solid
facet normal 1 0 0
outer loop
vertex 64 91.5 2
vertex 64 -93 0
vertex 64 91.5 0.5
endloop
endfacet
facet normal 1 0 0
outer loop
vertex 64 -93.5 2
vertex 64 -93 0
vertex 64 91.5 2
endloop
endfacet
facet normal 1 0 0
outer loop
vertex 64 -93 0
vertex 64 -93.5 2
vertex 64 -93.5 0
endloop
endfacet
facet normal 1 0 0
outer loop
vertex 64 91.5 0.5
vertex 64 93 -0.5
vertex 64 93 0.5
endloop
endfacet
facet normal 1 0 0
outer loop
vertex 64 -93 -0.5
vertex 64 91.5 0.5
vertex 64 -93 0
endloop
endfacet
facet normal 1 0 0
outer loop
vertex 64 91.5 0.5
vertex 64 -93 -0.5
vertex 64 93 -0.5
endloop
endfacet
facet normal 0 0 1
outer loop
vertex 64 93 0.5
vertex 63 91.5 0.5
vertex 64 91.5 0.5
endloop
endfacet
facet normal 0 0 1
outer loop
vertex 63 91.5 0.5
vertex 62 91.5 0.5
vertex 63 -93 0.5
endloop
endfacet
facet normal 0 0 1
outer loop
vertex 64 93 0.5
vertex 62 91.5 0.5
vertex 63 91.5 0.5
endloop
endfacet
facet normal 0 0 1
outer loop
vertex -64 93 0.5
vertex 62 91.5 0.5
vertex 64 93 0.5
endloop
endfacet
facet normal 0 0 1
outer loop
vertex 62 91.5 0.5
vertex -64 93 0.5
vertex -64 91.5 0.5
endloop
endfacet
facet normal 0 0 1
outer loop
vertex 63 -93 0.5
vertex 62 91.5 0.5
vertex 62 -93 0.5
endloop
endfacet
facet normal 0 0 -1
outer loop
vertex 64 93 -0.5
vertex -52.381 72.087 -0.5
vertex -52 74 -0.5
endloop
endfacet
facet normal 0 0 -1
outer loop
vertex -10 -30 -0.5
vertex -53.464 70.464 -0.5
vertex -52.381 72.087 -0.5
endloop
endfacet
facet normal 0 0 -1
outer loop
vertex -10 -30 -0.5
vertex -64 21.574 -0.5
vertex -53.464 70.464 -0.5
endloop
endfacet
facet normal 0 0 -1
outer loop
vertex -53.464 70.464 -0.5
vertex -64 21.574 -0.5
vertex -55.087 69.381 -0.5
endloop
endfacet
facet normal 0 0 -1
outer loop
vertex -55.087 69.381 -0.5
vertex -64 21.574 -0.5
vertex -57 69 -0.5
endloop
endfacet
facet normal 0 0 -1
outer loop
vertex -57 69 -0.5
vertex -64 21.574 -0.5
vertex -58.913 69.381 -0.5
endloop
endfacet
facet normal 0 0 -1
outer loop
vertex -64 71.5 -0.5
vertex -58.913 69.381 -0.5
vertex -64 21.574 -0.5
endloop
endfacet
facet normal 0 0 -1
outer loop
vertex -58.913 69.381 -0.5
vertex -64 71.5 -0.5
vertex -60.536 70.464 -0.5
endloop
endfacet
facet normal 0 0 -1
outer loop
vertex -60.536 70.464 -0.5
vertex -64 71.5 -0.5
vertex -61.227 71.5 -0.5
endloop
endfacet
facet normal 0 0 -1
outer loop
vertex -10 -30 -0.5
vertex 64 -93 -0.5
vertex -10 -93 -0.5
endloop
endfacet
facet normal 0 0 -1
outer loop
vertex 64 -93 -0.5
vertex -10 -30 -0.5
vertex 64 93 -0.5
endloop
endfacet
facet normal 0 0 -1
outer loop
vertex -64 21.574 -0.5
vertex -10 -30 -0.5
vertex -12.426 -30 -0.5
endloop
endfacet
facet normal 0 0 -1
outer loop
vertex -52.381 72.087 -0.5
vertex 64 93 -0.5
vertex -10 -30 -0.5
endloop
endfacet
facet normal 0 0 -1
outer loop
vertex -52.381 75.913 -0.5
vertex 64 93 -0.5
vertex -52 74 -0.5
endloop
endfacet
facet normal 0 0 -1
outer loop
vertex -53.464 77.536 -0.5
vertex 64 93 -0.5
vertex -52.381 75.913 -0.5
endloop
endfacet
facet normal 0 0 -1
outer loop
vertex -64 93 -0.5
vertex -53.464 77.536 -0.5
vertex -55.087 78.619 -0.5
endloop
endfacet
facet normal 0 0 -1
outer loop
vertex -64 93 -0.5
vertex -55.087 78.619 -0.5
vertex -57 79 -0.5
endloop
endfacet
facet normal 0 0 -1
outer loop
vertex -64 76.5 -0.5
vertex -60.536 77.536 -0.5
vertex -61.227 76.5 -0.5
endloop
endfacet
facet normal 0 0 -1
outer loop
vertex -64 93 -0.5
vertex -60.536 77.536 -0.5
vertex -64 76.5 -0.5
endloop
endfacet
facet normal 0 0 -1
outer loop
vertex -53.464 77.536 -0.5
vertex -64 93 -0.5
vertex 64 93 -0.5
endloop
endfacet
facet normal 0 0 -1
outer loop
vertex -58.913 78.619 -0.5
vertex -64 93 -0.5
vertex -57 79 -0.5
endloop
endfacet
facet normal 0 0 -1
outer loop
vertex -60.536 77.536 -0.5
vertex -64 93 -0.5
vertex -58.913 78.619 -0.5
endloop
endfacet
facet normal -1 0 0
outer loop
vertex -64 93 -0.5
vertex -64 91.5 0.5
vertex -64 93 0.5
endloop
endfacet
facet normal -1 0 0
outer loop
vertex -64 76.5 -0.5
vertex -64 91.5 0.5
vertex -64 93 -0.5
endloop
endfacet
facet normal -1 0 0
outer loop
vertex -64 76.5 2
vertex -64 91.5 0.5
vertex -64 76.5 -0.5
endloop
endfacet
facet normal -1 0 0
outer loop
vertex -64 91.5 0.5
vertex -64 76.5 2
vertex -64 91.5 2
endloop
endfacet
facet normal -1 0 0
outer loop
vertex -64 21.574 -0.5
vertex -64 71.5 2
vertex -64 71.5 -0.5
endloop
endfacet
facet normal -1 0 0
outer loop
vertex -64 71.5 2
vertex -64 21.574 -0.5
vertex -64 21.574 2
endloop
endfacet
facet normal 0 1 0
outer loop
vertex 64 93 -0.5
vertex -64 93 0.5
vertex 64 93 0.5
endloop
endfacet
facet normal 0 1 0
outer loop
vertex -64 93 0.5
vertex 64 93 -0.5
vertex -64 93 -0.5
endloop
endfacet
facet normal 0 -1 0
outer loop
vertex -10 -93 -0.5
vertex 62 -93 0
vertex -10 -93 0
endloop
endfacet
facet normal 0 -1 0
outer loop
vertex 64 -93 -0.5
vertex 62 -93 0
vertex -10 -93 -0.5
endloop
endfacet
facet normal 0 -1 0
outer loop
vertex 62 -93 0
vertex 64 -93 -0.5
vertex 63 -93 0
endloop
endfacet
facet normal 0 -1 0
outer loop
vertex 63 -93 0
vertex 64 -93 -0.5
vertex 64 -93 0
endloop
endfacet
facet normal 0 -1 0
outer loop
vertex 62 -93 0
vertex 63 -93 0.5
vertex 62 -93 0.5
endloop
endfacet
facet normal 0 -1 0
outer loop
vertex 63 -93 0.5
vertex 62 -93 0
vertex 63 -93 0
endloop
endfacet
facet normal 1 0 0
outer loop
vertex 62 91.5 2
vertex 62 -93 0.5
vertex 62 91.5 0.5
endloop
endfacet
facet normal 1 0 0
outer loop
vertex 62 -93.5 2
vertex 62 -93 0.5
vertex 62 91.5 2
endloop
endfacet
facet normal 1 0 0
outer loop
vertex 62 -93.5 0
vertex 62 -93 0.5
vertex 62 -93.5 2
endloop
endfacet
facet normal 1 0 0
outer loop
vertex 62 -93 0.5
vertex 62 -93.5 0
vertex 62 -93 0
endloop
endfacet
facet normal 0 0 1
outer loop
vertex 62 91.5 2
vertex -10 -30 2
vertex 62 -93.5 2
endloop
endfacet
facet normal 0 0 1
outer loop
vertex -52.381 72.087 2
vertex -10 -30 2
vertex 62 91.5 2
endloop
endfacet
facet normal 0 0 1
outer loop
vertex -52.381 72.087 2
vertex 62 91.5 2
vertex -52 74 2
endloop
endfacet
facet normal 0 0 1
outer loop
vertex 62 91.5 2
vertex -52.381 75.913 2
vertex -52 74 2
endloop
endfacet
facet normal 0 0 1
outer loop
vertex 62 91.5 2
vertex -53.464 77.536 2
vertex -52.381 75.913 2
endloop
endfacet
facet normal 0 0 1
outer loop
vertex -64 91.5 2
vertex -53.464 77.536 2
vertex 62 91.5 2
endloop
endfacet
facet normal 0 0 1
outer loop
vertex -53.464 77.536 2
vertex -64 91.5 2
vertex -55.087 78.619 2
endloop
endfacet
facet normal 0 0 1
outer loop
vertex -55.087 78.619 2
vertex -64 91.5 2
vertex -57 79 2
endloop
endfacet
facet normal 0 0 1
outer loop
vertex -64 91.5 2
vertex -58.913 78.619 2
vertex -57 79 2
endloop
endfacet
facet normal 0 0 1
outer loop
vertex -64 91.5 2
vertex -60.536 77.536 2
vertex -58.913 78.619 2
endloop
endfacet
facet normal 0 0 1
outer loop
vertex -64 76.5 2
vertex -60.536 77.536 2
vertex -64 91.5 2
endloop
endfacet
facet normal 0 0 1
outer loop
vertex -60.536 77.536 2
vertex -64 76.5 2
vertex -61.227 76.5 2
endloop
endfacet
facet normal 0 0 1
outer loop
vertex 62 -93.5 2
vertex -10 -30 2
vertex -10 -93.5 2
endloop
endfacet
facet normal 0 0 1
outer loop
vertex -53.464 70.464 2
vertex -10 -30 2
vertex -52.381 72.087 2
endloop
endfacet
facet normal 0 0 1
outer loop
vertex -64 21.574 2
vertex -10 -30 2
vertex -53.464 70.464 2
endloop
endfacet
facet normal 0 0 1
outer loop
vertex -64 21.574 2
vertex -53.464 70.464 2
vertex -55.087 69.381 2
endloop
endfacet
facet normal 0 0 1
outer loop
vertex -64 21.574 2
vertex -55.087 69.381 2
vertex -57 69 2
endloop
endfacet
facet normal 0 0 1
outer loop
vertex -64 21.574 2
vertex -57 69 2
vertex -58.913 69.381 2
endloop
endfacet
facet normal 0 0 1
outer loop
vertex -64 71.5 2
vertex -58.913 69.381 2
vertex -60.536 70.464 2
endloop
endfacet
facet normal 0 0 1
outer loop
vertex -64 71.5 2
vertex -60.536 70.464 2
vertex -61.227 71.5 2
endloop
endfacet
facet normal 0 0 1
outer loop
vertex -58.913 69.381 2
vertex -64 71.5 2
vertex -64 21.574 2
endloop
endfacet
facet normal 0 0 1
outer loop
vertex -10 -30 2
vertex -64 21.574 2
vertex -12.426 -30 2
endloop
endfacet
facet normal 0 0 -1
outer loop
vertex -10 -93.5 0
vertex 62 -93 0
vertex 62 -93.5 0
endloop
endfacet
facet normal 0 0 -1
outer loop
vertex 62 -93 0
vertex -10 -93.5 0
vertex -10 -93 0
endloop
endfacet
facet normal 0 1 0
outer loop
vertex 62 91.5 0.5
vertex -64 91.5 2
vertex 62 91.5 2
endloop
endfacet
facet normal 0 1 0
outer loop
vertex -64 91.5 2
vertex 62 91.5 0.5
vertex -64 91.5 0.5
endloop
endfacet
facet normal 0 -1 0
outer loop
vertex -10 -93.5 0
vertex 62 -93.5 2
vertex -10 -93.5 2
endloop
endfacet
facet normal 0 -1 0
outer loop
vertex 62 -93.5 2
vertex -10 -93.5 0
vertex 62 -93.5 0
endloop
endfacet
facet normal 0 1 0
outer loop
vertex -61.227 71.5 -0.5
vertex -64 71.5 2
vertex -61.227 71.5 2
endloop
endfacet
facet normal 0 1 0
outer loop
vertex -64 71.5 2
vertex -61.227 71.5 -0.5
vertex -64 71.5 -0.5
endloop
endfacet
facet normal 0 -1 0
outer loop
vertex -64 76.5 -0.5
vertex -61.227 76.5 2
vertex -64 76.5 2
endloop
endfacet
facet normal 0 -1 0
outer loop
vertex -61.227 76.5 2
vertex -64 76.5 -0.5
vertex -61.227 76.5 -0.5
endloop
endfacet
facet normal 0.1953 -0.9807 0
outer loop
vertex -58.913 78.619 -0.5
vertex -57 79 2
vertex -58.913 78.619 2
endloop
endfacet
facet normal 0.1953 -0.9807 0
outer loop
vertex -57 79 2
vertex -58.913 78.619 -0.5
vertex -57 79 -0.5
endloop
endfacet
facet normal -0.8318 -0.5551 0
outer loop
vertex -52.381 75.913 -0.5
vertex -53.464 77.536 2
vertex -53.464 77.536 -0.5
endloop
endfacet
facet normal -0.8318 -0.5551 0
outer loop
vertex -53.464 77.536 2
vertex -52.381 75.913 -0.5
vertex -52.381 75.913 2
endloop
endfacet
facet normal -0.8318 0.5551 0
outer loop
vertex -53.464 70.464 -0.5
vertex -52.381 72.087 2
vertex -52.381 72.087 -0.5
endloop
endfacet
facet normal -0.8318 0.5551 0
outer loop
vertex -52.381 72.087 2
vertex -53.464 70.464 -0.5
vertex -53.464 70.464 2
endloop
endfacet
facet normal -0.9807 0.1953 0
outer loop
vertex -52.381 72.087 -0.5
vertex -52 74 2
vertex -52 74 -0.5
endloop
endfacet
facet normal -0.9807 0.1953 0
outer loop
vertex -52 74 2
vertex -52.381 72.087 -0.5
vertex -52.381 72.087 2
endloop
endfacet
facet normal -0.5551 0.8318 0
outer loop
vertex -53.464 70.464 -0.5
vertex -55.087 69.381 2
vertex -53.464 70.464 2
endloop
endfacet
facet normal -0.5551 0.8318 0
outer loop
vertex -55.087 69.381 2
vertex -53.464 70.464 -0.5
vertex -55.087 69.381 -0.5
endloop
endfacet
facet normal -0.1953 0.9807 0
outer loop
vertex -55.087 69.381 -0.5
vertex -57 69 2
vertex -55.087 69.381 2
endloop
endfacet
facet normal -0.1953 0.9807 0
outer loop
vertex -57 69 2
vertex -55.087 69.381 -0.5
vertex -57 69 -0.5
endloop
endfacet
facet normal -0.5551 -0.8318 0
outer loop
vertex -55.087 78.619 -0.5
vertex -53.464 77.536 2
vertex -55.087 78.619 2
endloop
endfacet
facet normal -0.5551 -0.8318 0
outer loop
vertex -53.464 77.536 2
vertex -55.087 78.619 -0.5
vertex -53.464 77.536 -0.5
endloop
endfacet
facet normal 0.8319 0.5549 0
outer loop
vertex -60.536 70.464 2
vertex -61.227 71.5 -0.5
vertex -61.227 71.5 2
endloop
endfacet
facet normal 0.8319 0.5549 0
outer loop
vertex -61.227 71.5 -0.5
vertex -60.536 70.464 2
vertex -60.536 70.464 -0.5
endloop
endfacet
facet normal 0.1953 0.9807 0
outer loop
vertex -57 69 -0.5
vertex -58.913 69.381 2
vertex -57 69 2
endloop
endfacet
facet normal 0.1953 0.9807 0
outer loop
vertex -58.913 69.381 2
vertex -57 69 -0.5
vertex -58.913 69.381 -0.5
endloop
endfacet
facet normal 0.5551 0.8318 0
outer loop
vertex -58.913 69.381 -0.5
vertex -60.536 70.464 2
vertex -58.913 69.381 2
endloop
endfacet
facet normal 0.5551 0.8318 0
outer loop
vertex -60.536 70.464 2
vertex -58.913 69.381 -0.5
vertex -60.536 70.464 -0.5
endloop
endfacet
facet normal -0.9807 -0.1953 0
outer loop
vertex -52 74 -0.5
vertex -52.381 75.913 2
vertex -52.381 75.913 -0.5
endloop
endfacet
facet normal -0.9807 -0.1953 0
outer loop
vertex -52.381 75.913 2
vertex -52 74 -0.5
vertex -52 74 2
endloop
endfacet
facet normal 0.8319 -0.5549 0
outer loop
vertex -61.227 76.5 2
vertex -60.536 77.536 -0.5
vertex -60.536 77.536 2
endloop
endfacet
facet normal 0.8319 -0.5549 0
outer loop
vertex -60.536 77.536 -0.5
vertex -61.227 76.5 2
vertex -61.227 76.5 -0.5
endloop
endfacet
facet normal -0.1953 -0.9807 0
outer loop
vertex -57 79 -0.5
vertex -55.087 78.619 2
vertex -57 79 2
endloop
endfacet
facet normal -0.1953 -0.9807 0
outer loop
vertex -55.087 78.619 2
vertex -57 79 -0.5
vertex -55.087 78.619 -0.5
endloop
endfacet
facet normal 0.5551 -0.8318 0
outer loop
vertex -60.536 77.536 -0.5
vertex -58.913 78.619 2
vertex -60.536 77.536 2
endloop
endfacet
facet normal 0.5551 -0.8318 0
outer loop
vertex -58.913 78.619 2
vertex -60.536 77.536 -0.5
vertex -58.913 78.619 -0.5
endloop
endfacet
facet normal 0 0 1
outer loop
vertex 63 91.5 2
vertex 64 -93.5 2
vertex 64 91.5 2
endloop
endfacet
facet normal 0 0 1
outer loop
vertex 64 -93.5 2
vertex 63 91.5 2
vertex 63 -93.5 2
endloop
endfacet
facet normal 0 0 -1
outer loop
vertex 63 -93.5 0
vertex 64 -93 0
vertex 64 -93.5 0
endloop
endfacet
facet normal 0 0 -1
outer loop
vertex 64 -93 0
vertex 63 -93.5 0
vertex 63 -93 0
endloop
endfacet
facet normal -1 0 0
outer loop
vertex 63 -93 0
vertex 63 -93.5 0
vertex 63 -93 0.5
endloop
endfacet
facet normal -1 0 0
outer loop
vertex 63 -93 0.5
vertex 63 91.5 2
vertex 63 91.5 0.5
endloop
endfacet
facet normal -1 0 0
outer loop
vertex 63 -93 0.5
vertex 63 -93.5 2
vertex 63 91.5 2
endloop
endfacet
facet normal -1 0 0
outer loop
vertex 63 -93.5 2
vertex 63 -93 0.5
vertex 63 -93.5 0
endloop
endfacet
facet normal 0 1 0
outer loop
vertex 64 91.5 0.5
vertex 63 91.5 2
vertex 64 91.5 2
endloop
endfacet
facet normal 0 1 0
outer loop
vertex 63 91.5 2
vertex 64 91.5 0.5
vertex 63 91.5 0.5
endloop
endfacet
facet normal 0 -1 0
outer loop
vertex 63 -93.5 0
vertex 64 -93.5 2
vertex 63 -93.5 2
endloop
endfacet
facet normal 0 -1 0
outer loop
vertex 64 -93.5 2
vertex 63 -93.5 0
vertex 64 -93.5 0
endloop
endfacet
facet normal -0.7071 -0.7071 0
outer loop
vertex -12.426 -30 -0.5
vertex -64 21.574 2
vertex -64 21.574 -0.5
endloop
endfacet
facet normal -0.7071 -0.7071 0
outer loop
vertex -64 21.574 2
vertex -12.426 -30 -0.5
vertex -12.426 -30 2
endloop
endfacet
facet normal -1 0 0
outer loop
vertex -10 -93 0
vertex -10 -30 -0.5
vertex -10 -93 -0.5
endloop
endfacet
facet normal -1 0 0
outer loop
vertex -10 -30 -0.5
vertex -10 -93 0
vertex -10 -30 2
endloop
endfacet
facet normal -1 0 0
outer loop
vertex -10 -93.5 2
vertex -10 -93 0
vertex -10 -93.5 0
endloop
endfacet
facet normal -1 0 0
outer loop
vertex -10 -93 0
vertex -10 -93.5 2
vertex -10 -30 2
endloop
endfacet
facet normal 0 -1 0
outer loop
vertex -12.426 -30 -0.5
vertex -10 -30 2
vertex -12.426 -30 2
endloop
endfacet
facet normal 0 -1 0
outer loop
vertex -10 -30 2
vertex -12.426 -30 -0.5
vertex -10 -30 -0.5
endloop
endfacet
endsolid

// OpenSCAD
// file: piece-6-rampe-2.scad
module piece6d(){
    rotate([180,0,0]){
        union(){
            difference(){
                difference(){
                    union(){
                        cube([84,38,2],center=true);
                        translate([0,0,-0.5]){
                            cube([84,39,1],center=true);
                        }
                    }
                    translate([-10,22,0]){
                        rotate([0,0,25]){
                            cube([100,50,4],center=true);
                        }
                    }
                }
                translate([0,-2,-0.5]){
                    rotate([0,0,25]){
                        cube([100,1,1],center=true);
                    }
                }
            }
            translate([42,0,0]){cube([10,5,2],center=true);}
            translate([50,0,-1]){cylinder(h=2,r=5);}
        }
    }
}
// main file
include <piece-6-rampe-2.scad>;
difference(){
    union(){
        difference(){
            union(){
                cube([128,186,1],center=true);
                translate([-1,-1,1]){cube([126,185,2],center=true);}
            }
            union(){
                translate([-107,74,0]) {piece6d();}
                translate([-107,74,1.5]) {piece6d();}
            }
        }
        translate([63.5,-1,1]) {cube([1,185,2],center=true);}
    }
    rotate([0,180,0]){
        rotate([0,0,45]){
            translate([30,-75,0]) {
                cube([90,90,8],center=true);
            }
        }
        translate([55,-75,0]) {
            cube([90,90,8],center=true);
        }
    }
}
